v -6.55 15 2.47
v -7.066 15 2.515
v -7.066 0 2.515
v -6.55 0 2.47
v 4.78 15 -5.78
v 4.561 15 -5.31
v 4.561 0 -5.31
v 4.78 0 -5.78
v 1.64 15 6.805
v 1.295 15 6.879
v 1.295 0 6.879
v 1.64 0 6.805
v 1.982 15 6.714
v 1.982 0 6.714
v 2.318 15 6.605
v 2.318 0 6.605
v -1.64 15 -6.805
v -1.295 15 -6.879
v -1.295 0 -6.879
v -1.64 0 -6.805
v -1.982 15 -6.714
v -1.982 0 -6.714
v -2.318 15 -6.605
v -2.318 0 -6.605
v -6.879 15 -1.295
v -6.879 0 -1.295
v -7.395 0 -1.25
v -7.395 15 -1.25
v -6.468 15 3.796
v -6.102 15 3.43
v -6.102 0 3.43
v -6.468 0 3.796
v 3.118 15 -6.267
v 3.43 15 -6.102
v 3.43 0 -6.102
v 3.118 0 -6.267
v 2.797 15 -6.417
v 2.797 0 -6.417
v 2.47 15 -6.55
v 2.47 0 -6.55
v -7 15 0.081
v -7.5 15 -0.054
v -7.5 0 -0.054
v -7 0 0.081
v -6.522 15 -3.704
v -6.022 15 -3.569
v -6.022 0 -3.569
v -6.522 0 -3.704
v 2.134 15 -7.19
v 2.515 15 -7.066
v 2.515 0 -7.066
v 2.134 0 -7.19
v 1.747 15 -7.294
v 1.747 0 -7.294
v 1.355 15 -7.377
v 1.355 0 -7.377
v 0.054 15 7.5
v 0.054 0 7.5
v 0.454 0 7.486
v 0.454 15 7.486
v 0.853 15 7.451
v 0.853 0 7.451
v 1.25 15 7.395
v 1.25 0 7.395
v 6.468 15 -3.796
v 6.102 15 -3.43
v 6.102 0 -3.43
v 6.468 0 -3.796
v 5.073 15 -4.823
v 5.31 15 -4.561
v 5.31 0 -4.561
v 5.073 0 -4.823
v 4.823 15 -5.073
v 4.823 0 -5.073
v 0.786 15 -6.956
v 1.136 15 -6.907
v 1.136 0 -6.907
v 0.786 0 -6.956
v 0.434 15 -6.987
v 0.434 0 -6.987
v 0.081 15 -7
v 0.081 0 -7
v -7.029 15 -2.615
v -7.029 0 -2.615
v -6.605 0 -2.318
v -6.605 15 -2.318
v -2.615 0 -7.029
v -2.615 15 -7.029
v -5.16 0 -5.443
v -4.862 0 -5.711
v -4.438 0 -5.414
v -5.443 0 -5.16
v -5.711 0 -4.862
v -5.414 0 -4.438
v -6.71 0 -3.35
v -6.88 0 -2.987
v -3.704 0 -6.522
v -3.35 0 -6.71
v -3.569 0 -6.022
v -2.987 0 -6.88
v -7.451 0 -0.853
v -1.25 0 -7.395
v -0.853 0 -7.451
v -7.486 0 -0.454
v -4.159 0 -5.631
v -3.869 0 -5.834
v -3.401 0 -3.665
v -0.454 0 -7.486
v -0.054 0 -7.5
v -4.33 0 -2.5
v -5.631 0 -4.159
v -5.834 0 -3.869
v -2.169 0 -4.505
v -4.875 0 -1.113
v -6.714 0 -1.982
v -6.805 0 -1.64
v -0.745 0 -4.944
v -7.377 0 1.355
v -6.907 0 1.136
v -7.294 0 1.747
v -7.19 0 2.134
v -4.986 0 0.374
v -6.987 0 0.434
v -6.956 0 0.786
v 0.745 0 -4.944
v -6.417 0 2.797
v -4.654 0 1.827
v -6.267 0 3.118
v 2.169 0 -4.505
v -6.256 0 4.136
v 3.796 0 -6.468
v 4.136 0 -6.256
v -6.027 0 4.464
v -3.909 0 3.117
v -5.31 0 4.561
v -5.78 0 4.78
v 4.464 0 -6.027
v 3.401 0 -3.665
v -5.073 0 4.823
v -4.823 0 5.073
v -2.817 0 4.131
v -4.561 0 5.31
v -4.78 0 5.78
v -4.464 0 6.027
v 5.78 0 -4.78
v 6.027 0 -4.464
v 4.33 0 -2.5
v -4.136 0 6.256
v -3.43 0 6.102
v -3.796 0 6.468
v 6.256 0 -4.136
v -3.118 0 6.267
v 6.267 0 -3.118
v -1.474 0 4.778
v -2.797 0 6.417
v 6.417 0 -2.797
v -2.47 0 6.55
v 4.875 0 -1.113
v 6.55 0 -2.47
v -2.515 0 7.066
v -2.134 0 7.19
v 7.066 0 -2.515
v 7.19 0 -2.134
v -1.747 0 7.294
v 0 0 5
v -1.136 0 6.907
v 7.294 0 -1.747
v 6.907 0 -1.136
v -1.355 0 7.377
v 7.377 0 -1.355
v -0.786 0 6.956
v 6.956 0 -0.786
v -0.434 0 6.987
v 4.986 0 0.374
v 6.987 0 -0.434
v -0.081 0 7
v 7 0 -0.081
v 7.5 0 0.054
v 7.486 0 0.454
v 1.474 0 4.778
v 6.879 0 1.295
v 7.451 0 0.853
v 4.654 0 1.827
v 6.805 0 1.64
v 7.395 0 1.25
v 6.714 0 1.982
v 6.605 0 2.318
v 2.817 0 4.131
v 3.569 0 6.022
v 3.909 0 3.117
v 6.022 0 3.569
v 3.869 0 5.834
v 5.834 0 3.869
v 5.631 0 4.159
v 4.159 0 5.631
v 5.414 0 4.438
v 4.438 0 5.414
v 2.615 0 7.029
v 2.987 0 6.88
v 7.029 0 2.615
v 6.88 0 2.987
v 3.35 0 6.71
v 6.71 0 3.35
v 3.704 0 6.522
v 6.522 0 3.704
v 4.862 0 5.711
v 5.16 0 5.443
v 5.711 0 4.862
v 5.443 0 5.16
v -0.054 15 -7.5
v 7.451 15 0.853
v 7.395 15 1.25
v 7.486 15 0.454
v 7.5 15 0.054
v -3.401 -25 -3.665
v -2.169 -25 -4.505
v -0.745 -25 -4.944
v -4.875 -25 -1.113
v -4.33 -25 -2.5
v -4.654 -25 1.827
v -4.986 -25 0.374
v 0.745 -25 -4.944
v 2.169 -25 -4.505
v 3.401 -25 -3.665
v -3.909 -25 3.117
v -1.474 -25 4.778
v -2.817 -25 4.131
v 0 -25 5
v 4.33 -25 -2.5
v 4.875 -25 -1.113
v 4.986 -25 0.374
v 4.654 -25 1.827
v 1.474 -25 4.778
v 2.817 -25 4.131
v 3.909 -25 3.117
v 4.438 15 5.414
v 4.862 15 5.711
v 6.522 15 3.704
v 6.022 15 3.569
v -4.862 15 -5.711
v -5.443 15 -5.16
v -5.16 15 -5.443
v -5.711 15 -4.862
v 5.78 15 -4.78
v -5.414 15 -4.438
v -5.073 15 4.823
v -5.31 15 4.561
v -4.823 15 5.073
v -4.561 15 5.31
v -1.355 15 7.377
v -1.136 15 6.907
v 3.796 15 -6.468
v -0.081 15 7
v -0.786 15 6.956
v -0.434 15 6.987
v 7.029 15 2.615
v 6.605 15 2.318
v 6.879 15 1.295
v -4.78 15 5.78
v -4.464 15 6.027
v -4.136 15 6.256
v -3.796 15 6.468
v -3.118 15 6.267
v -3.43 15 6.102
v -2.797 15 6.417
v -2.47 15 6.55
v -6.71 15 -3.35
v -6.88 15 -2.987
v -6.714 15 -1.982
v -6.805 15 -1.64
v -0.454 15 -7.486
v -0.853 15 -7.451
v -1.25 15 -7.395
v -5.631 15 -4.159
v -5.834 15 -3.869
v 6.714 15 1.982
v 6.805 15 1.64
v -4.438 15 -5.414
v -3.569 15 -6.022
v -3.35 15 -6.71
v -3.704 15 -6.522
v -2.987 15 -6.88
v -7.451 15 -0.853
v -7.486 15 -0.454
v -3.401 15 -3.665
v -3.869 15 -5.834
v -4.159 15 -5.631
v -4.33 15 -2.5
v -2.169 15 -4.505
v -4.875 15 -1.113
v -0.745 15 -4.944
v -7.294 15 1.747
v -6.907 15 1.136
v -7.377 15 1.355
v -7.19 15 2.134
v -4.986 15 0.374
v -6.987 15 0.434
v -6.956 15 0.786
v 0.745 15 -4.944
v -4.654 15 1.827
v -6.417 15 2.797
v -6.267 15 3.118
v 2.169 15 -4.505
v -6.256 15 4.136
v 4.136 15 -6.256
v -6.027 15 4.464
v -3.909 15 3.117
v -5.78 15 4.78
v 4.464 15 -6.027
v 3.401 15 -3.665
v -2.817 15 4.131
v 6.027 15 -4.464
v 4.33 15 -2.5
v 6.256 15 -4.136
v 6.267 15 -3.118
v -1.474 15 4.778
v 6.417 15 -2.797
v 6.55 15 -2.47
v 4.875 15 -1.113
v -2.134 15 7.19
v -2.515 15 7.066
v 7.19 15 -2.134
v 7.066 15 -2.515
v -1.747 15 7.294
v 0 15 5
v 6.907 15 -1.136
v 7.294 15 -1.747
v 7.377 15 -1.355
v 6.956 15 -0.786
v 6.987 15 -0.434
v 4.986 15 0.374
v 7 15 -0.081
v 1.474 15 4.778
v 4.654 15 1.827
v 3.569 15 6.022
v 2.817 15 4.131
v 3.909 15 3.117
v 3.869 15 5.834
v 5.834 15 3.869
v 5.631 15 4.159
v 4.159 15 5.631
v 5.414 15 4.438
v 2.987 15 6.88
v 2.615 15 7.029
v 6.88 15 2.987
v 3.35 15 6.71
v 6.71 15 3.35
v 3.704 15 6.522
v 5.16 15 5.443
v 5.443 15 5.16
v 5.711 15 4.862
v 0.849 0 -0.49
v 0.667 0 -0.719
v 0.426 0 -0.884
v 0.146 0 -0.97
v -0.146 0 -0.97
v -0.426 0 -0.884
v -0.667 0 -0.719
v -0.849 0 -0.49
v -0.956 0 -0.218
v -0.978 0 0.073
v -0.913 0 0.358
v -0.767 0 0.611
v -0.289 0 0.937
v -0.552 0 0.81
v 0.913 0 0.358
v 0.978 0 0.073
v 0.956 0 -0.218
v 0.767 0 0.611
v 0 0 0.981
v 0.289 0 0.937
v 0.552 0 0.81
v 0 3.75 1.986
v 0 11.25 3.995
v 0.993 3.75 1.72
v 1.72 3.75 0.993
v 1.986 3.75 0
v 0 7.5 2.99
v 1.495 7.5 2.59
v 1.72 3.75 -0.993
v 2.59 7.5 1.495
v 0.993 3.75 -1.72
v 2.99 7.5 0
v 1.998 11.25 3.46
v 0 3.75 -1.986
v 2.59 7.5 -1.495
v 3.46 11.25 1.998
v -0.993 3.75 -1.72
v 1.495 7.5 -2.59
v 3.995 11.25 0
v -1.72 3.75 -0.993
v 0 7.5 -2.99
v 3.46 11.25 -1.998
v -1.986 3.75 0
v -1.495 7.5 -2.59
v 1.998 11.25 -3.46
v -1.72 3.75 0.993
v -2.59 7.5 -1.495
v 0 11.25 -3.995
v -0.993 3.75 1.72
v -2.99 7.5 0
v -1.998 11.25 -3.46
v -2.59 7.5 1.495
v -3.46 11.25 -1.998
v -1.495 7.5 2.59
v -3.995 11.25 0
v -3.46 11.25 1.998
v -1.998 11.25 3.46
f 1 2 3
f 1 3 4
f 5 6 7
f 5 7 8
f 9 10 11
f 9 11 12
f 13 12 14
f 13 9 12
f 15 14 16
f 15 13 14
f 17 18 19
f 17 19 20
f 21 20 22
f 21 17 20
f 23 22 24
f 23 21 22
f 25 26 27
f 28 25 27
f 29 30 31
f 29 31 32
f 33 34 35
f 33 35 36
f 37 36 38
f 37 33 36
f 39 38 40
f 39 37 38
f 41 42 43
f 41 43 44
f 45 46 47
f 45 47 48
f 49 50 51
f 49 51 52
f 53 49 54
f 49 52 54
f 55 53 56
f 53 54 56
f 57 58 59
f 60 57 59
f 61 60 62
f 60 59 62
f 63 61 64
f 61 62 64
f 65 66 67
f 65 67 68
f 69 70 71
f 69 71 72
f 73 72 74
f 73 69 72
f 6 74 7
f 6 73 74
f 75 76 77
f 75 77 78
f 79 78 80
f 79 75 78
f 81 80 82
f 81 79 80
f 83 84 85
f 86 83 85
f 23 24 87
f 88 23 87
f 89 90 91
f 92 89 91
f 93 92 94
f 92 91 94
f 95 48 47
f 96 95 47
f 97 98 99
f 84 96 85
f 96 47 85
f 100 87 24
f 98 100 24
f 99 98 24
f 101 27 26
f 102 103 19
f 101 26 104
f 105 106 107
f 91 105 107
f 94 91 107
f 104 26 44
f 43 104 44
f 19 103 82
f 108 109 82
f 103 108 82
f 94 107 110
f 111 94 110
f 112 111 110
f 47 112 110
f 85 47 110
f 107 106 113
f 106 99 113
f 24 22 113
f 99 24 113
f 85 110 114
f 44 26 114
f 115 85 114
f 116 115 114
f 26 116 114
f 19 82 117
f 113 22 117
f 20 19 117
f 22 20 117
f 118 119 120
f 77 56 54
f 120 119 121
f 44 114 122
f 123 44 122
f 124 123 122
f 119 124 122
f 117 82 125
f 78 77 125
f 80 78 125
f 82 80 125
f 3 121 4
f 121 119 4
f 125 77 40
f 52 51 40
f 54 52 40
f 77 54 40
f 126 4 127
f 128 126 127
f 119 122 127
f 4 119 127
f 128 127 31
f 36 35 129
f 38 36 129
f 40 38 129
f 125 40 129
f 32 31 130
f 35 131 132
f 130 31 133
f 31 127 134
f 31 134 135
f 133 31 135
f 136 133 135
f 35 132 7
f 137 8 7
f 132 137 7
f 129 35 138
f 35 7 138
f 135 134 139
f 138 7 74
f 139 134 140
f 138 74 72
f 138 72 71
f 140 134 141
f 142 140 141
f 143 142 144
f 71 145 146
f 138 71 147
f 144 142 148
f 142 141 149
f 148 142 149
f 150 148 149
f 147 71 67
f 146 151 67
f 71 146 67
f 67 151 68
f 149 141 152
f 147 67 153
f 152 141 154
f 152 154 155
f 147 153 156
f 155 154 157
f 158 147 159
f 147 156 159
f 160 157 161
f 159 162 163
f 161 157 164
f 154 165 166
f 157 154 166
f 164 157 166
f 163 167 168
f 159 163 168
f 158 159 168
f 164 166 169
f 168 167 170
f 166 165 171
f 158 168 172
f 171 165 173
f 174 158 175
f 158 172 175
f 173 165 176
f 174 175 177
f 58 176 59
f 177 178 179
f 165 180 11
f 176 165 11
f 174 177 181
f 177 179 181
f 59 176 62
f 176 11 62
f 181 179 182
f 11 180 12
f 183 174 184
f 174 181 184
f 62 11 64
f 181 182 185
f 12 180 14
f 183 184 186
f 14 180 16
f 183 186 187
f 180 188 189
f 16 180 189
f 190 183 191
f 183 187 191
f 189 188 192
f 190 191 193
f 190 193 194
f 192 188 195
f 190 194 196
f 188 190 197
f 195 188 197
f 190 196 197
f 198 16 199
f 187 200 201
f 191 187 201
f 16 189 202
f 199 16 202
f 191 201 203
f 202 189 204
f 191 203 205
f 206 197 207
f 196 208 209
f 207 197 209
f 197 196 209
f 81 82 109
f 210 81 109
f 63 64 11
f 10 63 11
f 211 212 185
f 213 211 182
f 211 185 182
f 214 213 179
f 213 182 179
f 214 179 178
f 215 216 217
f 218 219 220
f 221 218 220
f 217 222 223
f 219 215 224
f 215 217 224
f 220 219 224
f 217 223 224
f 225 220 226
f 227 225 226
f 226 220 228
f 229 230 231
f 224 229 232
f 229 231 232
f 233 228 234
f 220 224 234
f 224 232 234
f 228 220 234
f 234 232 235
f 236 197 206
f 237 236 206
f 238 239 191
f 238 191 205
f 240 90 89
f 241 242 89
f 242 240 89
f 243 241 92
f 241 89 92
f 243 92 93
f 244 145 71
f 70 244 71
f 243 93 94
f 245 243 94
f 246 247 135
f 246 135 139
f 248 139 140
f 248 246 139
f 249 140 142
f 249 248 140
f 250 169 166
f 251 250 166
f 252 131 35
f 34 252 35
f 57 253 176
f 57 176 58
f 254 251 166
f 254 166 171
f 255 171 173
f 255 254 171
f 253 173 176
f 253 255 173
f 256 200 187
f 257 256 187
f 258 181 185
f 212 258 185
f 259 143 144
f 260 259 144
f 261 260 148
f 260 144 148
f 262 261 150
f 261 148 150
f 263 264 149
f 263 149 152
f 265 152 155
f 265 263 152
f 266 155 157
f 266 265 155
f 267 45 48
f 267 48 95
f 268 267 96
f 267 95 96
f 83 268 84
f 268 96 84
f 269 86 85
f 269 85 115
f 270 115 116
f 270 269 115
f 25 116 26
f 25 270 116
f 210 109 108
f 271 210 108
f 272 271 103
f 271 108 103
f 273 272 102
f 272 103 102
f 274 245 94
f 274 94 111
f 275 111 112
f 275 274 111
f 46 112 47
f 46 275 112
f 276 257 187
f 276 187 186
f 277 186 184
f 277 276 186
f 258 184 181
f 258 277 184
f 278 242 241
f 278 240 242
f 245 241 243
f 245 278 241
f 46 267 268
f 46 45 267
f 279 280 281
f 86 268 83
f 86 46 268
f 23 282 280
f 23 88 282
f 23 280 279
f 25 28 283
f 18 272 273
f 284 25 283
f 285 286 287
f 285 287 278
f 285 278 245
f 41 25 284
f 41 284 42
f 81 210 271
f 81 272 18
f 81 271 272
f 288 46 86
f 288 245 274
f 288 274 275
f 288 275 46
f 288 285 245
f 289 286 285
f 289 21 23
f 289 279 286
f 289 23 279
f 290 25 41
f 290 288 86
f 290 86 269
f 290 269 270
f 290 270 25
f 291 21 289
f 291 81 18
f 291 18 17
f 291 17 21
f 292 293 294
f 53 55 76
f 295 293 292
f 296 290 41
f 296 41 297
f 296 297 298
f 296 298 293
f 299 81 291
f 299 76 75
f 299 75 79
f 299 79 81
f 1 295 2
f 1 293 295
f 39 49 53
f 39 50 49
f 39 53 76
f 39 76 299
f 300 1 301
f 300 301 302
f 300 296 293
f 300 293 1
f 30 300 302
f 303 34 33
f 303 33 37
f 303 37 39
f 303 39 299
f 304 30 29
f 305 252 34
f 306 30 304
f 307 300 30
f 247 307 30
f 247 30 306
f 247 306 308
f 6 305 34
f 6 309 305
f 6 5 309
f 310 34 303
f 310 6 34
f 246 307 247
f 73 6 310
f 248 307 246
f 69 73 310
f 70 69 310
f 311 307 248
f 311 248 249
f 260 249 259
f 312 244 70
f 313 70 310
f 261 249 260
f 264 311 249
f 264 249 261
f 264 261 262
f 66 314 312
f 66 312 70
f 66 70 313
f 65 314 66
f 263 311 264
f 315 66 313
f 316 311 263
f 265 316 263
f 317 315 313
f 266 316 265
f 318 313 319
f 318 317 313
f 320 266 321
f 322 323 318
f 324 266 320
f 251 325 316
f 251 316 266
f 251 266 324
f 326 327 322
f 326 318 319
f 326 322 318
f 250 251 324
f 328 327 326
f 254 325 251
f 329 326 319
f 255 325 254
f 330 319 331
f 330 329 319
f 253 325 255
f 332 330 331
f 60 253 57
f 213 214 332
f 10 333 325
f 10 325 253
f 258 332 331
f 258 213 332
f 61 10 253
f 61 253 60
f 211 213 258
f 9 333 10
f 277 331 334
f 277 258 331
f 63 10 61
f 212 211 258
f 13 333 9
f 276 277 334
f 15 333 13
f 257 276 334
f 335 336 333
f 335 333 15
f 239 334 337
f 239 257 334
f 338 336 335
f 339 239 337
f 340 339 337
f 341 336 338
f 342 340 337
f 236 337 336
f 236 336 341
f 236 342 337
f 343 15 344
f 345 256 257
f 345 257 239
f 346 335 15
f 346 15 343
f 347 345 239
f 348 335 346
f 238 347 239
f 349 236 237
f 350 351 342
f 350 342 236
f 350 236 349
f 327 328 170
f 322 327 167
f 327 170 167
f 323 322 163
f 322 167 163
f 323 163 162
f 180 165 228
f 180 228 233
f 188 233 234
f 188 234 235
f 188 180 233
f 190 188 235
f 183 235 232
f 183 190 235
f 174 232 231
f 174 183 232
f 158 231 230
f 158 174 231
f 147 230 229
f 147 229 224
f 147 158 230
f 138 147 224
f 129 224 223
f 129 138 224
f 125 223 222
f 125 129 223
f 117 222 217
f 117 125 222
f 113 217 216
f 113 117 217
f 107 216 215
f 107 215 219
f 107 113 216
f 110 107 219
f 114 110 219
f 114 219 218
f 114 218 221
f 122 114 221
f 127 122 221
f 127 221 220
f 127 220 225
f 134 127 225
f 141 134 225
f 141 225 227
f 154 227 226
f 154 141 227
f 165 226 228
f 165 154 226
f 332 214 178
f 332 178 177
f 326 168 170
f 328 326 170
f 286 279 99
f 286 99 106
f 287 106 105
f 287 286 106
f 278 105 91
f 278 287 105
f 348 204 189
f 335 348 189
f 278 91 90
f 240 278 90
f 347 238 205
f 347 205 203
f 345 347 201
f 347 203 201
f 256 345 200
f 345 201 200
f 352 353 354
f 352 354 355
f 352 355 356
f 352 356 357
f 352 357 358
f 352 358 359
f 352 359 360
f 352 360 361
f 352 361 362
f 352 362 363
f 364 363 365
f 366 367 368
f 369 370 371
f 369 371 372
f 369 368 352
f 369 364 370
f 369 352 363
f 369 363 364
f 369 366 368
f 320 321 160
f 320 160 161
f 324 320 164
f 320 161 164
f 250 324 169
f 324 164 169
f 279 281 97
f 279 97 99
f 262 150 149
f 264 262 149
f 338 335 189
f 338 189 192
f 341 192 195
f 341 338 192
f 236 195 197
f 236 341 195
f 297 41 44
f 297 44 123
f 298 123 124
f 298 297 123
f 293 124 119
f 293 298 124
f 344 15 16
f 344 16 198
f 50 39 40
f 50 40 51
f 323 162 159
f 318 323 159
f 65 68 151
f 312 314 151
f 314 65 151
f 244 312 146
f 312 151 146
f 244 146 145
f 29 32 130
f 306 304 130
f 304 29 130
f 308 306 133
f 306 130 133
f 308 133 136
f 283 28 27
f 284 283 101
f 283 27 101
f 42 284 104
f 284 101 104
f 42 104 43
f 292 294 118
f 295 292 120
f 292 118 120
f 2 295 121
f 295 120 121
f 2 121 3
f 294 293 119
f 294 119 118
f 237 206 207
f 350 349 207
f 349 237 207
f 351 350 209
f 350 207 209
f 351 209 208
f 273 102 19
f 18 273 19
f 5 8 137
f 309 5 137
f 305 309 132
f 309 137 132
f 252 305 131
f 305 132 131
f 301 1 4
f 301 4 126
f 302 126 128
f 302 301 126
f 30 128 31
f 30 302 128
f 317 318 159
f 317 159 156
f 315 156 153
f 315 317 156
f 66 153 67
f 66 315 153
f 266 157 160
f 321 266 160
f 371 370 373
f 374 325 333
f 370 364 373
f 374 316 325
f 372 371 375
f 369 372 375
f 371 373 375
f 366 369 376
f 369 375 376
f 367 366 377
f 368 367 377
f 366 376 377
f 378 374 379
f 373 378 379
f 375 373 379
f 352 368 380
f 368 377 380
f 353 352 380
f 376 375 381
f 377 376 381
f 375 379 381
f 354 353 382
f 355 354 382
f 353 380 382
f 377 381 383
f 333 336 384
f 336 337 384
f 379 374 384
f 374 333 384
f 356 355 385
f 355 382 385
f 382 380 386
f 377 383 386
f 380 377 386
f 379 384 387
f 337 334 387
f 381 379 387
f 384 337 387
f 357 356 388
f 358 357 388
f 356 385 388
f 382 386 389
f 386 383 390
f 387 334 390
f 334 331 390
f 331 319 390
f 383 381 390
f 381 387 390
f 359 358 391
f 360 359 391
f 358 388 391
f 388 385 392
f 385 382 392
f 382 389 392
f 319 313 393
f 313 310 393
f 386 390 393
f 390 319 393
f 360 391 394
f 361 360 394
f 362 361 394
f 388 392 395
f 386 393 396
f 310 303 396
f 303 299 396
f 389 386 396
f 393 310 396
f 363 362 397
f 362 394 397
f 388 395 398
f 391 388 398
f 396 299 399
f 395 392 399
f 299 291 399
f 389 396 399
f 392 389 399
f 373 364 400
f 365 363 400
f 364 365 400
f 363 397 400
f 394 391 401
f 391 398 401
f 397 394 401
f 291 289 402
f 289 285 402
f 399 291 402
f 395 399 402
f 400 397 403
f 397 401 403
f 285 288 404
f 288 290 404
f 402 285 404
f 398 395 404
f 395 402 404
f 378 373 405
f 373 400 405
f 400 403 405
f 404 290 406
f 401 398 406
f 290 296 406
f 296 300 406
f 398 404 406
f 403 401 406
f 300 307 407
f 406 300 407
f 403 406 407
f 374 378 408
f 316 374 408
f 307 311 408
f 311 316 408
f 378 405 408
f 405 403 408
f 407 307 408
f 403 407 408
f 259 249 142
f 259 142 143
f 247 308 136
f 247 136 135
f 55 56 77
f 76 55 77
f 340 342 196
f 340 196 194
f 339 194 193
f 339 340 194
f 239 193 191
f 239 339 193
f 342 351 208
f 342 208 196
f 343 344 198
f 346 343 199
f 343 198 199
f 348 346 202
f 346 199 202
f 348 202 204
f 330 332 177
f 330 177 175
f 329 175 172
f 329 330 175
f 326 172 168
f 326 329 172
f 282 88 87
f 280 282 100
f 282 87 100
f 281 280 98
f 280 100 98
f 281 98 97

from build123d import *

# Parameters (mm, degrees)
SKETCH1_R           = 7.5
BOSS_EXTRUDE1_DEPTH = 15
SKETCH1_3_R         = 5
BOSS_EXTRUDE2_DEPTH = 25
CUT_EXTRUDE1_DEPTH  = 42.382363393
SKETCH3_R           = 5
CUT_EXTRUDE2_DEPTH  = 15
CUT_EXTRUDE2_DRAFT  = -15
CIRPATTERN1_COUNT   = 18


with BuildPart() as part:
    # Sketch1 → Boss-Extrude1 (new body)
    with BuildSketch(Plane(origin=(0, 0, 0), x_dir=(1, 0, 0), z_dir=(0, 1, 0))):
        Circle(SKETCH1_R)
    extrude(amount=BOSS_EXTRUDE1_DEPTH)

    # Sketch1<3> → Boss-Extrude2 (add)
    with BuildSketch(Plane(origin=(0, 0, 0), x_dir=(1, 0, 0), z_dir=(0, 1, 0))):
        Circle(SKETCH1_3_R)
    extrude(amount=-BOSS_EXTRUDE2_DEPTH)

    # Sketch2 → Cut-Extrude1 (cut, through all)
    with BuildSketch(Plane(origin=(0, 15, 0), x_dir=(1, 0, 0), z_dir=(0, 1, 0))):
        with BuildLine():
            Line((1.572944175, 7.843841318), (1.13617114, 6.907178522))
            ThreePointArc((1.13617114, 6.907178522), (0.610090199, 6.973362887), (0.080508816, 6.999537008))
            Line((0.080508816, 6.999537008), (-0.186978867, 7.997814633))
            ThreePointArc((-0.186978867, 7.997814633), (0.697245942, 7.969557585), (1.572944175, 7.843841318))
        make_face()
    cut_extrude1 = extrude(amount=-CUT_EXTRUDE1_DEPTH, mode=Mode.SUBTRACT)


with BuildPart() as cut_extrude2_tool:
    # Sketch3 → Cut-Extrude2 (with draft: the straight prism first)
    with BuildSketch(Plane(origin=(0, 15, 0), x_dir=(1, 0, 0), z_dir=(0, 1, 0))):
        Circle(SKETCH3_R)
    extrude(amount=-CUT_EXTRUDE2_DEPTH)
    # Cut-Extrude2: the draft: its side faces are tilted about the plane it starts from
    cut_extrude2_sides = [cut_extrude2_tool.faces().sort_by_distance(p)[0] for p in [
        (-5, 7.5, 0),
    ]]
    draft(cut_extrude2_sides, Plane(origin=(0, 15, 0), x_dir=(1, 0, 0), z_dir=(0, 1, 0)), CUT_EXTRUDE2_DRAFT)


with BuildPart() as part_1:
    add(part.part)

    # Cut-Extrude2: cut by cut_extrude2_tool
    add(cut_extrude2_tool.part, mode=Mode.SUBTRACT)

    # CirPattern1: Cut-Extrude1 ×18 about axis
    cirpattern1_axis = Axis((0, 15, 0), (0, 1, 0))
    for i in range(1, CIRPATTERN1_COUNT):
        add(cut_extrude1.rotate(cirpattern1_axis, i * 360 / CIRPATTERN1_COUNT), mode=Mode.SUBTRACT)


solid = part_1.part
